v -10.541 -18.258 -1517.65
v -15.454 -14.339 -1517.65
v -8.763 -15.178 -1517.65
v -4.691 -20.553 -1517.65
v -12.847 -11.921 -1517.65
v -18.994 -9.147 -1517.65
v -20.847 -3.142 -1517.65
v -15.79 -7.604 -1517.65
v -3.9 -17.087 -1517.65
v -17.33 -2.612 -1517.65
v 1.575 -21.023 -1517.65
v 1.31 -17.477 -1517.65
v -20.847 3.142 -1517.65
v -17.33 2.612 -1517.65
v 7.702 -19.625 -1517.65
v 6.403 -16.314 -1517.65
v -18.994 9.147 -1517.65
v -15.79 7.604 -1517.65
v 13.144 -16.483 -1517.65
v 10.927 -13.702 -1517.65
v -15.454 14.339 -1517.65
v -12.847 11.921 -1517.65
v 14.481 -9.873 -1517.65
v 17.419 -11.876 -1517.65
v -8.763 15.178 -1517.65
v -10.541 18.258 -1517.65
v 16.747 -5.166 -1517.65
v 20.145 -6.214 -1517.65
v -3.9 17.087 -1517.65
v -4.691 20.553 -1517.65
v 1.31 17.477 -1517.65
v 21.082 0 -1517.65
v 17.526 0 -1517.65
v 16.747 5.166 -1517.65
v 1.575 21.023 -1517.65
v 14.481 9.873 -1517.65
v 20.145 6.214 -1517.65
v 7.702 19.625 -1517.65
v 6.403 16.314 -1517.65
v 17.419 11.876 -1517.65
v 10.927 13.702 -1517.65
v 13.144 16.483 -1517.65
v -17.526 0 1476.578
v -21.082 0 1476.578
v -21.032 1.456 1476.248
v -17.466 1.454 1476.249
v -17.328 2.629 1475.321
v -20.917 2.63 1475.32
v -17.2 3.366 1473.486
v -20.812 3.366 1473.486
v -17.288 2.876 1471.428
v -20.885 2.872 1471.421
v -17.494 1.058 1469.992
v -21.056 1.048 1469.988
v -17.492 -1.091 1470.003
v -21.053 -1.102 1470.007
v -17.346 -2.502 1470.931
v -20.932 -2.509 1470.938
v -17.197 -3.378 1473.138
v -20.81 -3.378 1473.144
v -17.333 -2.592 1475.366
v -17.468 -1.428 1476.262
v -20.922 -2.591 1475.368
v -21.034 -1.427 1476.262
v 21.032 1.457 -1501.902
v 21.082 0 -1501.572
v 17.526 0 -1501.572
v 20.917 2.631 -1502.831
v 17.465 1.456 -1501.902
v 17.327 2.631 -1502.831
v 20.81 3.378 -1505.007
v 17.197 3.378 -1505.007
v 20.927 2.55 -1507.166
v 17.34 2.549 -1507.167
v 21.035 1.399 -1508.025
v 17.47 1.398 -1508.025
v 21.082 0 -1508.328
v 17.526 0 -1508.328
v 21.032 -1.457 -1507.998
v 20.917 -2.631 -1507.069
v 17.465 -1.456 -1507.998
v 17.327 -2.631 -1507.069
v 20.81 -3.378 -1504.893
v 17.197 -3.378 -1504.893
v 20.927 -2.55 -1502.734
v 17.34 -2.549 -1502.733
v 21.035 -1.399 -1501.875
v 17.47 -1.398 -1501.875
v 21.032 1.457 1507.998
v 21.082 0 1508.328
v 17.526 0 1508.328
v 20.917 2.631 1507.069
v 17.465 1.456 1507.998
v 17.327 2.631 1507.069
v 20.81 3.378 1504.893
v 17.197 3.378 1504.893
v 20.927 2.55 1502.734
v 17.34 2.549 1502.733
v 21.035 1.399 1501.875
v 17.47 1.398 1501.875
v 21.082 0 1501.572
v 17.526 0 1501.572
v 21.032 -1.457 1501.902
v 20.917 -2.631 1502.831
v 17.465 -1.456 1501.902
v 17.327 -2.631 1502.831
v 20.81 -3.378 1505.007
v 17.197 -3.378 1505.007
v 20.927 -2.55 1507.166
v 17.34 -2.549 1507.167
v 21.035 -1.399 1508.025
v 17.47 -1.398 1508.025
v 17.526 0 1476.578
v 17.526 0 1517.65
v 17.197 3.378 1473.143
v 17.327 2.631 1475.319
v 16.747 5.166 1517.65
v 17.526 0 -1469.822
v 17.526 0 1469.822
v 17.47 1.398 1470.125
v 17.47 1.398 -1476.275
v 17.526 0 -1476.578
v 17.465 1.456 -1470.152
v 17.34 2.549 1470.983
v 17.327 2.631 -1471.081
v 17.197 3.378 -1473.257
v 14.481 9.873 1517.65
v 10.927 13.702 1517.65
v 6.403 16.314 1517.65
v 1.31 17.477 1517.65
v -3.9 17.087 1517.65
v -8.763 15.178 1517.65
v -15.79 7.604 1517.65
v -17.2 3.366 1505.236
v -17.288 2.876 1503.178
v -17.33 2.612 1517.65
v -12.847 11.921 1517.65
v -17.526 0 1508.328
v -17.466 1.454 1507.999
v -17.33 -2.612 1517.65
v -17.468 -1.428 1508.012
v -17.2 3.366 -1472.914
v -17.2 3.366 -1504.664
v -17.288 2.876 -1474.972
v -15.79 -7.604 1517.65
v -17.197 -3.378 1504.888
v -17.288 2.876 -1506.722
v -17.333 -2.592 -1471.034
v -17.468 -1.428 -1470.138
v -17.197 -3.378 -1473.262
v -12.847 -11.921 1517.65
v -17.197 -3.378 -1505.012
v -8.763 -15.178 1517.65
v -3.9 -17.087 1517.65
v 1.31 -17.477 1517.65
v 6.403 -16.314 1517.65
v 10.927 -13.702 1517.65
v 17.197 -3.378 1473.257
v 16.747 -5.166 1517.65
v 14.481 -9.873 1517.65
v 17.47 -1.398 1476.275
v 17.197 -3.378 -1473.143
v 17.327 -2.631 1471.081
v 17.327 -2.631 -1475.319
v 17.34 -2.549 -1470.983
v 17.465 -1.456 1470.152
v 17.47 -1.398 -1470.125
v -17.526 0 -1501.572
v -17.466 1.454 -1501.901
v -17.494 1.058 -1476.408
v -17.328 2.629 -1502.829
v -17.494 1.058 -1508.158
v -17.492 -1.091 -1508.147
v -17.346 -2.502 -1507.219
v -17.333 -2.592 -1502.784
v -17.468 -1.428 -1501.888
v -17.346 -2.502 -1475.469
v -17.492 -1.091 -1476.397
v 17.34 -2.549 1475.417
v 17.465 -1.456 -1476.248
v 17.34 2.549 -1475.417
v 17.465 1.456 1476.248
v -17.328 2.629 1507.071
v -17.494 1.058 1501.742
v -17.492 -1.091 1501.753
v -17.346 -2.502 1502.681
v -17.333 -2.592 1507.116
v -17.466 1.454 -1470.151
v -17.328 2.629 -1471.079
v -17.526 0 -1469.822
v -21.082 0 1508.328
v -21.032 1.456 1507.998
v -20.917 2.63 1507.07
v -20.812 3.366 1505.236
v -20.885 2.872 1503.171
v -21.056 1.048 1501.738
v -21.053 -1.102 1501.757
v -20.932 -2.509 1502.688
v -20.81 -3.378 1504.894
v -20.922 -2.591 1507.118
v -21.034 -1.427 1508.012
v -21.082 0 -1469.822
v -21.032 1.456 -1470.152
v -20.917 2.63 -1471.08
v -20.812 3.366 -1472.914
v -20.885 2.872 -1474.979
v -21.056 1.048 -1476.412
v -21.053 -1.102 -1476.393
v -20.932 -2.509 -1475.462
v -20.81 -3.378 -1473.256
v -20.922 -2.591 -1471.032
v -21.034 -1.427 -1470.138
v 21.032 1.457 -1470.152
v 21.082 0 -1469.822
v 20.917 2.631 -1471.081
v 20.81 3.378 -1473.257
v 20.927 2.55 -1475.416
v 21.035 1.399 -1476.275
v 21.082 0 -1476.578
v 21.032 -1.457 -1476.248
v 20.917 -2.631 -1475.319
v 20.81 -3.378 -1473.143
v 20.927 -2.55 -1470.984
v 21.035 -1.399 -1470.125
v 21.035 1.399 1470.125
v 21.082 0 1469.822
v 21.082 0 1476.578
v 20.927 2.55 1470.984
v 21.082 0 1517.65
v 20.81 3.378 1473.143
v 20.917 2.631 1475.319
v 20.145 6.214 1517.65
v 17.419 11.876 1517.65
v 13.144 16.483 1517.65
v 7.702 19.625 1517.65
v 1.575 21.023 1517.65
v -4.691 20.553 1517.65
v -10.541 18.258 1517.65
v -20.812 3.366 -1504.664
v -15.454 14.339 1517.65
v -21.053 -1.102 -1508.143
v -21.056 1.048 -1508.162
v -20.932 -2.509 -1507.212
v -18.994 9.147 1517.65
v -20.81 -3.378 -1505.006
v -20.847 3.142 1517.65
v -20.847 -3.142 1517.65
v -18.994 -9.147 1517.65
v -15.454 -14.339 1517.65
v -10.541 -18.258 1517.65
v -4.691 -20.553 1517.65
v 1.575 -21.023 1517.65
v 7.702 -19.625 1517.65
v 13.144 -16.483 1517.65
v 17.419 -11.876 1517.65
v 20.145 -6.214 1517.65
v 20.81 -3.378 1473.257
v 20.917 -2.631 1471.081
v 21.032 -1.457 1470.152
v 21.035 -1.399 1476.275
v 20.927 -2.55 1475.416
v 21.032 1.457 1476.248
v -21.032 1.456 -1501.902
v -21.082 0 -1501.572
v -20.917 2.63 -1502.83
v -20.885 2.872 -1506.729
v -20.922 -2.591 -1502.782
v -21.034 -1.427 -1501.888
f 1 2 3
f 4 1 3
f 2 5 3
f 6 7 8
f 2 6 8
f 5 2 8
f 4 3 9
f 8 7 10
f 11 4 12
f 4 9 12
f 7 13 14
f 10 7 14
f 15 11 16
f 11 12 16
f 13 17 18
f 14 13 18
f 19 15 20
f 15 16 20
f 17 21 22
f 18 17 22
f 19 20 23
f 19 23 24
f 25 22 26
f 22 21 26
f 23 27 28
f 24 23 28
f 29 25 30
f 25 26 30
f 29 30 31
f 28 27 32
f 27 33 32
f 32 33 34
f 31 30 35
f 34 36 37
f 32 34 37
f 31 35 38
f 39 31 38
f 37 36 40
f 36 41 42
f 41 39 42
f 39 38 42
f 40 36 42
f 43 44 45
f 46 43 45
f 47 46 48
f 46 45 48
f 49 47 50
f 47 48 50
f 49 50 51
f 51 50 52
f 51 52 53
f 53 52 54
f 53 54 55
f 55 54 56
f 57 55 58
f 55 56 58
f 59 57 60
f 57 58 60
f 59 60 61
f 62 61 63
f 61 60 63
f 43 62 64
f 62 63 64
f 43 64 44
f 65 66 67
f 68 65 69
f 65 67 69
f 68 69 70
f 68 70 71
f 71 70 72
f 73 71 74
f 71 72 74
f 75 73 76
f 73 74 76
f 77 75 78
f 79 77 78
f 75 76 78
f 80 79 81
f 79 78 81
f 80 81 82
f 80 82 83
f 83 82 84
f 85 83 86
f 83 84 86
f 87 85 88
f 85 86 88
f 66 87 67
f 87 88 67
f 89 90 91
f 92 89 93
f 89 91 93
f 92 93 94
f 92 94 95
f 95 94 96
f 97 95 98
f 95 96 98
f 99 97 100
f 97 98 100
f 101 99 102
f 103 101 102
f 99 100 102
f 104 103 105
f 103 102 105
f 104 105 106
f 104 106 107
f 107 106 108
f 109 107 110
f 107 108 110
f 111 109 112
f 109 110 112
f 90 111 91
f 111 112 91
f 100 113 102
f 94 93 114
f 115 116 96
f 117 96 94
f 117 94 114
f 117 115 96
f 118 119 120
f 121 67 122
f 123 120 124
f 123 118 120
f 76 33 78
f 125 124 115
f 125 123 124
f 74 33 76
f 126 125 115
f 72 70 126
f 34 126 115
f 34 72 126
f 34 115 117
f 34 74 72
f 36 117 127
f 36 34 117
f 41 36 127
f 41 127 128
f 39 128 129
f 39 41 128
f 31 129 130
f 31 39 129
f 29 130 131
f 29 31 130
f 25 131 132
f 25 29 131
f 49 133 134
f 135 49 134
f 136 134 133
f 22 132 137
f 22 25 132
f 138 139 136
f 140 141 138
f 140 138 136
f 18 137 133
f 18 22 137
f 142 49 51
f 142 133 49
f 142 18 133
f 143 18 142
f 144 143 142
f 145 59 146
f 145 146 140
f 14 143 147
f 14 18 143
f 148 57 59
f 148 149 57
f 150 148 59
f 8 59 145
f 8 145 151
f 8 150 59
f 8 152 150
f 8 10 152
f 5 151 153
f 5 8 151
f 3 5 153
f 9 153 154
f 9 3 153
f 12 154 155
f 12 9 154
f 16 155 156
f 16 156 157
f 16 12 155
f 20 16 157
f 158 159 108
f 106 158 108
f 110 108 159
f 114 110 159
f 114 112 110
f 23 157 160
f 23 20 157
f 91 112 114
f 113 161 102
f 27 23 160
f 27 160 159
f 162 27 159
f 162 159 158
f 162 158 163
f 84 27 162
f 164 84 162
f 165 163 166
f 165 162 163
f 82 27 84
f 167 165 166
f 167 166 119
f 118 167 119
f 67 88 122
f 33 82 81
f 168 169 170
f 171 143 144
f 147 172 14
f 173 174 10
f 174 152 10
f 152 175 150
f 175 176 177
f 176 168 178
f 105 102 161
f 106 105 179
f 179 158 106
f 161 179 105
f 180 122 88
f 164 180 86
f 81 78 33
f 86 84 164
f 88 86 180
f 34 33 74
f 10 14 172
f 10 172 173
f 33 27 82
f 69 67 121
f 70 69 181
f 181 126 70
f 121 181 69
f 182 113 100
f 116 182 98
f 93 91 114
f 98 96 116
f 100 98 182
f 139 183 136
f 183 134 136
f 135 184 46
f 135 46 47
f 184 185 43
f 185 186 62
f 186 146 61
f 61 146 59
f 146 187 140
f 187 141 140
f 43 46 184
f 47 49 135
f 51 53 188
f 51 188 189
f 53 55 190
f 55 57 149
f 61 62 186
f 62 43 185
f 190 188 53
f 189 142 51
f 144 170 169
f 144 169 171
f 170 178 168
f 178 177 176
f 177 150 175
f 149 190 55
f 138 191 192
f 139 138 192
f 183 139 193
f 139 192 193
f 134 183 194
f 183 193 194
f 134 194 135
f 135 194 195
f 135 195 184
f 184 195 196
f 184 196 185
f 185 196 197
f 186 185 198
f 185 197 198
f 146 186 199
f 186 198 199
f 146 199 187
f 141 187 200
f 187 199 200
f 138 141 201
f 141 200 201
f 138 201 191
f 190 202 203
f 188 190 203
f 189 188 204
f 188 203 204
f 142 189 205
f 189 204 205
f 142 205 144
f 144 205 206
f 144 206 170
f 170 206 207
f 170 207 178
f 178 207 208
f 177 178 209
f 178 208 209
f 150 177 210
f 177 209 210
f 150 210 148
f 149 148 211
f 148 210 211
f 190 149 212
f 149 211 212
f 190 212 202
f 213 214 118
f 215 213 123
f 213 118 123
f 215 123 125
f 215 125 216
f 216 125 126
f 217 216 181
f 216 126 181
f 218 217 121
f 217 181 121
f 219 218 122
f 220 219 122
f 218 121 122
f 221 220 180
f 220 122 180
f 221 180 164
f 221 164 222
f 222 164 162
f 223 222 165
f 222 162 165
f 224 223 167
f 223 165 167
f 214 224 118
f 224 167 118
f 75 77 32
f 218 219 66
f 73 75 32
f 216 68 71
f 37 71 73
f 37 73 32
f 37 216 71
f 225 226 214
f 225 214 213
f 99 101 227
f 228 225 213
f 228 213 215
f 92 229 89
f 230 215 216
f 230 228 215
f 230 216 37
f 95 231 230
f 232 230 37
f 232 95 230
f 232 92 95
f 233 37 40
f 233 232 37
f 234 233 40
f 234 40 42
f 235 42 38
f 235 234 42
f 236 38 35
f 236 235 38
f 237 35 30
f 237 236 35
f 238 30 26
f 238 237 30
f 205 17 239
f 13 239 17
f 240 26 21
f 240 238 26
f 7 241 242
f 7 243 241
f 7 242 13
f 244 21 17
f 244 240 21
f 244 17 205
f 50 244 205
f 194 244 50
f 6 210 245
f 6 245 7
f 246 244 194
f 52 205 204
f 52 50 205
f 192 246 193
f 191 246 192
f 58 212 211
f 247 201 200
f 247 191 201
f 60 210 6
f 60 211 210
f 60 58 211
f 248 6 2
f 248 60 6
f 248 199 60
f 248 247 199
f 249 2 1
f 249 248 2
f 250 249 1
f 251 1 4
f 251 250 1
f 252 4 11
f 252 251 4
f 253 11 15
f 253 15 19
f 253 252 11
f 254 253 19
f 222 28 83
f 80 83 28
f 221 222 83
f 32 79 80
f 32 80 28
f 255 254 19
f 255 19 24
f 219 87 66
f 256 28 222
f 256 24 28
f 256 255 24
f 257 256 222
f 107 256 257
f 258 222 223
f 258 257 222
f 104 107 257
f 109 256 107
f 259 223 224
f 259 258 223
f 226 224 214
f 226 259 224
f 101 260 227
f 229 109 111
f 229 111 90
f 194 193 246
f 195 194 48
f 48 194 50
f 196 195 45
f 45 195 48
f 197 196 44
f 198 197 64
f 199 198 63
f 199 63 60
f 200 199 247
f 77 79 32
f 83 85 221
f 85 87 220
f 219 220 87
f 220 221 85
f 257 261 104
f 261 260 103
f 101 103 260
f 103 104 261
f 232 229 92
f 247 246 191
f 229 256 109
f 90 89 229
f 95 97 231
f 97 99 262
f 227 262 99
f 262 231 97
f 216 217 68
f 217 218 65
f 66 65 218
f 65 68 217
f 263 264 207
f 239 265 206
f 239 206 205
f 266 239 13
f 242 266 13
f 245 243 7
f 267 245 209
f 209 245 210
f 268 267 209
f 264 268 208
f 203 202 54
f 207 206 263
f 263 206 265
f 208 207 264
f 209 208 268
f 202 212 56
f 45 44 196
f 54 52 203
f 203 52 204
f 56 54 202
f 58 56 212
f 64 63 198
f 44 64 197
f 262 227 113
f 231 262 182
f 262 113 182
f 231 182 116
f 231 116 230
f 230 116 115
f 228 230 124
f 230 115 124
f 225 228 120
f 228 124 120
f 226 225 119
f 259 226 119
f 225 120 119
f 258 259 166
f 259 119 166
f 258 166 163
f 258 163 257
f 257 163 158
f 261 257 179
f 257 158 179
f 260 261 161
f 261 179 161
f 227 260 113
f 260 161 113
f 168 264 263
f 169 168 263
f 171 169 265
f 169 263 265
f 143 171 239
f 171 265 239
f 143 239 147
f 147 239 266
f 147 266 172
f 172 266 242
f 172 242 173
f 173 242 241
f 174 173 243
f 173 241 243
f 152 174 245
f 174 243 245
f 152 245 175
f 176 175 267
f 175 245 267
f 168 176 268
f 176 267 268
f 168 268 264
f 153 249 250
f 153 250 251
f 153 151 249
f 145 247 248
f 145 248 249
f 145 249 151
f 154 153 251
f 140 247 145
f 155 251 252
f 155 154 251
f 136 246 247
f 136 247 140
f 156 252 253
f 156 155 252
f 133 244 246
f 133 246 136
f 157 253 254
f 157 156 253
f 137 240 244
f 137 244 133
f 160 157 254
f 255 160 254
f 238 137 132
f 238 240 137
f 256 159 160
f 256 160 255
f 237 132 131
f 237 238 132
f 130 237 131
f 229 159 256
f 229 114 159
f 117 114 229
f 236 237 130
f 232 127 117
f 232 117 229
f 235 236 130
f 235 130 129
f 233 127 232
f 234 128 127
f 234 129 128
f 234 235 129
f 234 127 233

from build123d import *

# Parameters (mm, degrees)
SKETCH1_R               = 21.082
SKETCH1_R_2             = 17.526
BOSS_EXTRUDE1_DEPTH     = 1517.65
F_1_4_CLEARANCE_HOLE1_D = 6.7564


with BuildPart() as part:
    # Sketch1 → Boss-Extrude1 (new body, symmetric)
    with BuildSketch(Plane.XY):
        Circle(SKETCH1_R)
        Circle(SKETCH1_R_2, mode=Mode.SUBTRACT)
    extrude(amount=BOSS_EXTRUDE1_DEPTH, both=True)

    # 1/4 Clearance Hole1 (through all)
    with Locations(Plane(origin=(21.082, 0, 0), x_dir=(0, 0, -1), z_dir=(1, 0, 0))):
        with Locations((-1504.95, 0), (-1473.2, 0), (1504.95, 0), (1473.2, 0)):
            Hole(F_1_4_CLEARANCE_HOLE1_D / 2)


solid = part.part
